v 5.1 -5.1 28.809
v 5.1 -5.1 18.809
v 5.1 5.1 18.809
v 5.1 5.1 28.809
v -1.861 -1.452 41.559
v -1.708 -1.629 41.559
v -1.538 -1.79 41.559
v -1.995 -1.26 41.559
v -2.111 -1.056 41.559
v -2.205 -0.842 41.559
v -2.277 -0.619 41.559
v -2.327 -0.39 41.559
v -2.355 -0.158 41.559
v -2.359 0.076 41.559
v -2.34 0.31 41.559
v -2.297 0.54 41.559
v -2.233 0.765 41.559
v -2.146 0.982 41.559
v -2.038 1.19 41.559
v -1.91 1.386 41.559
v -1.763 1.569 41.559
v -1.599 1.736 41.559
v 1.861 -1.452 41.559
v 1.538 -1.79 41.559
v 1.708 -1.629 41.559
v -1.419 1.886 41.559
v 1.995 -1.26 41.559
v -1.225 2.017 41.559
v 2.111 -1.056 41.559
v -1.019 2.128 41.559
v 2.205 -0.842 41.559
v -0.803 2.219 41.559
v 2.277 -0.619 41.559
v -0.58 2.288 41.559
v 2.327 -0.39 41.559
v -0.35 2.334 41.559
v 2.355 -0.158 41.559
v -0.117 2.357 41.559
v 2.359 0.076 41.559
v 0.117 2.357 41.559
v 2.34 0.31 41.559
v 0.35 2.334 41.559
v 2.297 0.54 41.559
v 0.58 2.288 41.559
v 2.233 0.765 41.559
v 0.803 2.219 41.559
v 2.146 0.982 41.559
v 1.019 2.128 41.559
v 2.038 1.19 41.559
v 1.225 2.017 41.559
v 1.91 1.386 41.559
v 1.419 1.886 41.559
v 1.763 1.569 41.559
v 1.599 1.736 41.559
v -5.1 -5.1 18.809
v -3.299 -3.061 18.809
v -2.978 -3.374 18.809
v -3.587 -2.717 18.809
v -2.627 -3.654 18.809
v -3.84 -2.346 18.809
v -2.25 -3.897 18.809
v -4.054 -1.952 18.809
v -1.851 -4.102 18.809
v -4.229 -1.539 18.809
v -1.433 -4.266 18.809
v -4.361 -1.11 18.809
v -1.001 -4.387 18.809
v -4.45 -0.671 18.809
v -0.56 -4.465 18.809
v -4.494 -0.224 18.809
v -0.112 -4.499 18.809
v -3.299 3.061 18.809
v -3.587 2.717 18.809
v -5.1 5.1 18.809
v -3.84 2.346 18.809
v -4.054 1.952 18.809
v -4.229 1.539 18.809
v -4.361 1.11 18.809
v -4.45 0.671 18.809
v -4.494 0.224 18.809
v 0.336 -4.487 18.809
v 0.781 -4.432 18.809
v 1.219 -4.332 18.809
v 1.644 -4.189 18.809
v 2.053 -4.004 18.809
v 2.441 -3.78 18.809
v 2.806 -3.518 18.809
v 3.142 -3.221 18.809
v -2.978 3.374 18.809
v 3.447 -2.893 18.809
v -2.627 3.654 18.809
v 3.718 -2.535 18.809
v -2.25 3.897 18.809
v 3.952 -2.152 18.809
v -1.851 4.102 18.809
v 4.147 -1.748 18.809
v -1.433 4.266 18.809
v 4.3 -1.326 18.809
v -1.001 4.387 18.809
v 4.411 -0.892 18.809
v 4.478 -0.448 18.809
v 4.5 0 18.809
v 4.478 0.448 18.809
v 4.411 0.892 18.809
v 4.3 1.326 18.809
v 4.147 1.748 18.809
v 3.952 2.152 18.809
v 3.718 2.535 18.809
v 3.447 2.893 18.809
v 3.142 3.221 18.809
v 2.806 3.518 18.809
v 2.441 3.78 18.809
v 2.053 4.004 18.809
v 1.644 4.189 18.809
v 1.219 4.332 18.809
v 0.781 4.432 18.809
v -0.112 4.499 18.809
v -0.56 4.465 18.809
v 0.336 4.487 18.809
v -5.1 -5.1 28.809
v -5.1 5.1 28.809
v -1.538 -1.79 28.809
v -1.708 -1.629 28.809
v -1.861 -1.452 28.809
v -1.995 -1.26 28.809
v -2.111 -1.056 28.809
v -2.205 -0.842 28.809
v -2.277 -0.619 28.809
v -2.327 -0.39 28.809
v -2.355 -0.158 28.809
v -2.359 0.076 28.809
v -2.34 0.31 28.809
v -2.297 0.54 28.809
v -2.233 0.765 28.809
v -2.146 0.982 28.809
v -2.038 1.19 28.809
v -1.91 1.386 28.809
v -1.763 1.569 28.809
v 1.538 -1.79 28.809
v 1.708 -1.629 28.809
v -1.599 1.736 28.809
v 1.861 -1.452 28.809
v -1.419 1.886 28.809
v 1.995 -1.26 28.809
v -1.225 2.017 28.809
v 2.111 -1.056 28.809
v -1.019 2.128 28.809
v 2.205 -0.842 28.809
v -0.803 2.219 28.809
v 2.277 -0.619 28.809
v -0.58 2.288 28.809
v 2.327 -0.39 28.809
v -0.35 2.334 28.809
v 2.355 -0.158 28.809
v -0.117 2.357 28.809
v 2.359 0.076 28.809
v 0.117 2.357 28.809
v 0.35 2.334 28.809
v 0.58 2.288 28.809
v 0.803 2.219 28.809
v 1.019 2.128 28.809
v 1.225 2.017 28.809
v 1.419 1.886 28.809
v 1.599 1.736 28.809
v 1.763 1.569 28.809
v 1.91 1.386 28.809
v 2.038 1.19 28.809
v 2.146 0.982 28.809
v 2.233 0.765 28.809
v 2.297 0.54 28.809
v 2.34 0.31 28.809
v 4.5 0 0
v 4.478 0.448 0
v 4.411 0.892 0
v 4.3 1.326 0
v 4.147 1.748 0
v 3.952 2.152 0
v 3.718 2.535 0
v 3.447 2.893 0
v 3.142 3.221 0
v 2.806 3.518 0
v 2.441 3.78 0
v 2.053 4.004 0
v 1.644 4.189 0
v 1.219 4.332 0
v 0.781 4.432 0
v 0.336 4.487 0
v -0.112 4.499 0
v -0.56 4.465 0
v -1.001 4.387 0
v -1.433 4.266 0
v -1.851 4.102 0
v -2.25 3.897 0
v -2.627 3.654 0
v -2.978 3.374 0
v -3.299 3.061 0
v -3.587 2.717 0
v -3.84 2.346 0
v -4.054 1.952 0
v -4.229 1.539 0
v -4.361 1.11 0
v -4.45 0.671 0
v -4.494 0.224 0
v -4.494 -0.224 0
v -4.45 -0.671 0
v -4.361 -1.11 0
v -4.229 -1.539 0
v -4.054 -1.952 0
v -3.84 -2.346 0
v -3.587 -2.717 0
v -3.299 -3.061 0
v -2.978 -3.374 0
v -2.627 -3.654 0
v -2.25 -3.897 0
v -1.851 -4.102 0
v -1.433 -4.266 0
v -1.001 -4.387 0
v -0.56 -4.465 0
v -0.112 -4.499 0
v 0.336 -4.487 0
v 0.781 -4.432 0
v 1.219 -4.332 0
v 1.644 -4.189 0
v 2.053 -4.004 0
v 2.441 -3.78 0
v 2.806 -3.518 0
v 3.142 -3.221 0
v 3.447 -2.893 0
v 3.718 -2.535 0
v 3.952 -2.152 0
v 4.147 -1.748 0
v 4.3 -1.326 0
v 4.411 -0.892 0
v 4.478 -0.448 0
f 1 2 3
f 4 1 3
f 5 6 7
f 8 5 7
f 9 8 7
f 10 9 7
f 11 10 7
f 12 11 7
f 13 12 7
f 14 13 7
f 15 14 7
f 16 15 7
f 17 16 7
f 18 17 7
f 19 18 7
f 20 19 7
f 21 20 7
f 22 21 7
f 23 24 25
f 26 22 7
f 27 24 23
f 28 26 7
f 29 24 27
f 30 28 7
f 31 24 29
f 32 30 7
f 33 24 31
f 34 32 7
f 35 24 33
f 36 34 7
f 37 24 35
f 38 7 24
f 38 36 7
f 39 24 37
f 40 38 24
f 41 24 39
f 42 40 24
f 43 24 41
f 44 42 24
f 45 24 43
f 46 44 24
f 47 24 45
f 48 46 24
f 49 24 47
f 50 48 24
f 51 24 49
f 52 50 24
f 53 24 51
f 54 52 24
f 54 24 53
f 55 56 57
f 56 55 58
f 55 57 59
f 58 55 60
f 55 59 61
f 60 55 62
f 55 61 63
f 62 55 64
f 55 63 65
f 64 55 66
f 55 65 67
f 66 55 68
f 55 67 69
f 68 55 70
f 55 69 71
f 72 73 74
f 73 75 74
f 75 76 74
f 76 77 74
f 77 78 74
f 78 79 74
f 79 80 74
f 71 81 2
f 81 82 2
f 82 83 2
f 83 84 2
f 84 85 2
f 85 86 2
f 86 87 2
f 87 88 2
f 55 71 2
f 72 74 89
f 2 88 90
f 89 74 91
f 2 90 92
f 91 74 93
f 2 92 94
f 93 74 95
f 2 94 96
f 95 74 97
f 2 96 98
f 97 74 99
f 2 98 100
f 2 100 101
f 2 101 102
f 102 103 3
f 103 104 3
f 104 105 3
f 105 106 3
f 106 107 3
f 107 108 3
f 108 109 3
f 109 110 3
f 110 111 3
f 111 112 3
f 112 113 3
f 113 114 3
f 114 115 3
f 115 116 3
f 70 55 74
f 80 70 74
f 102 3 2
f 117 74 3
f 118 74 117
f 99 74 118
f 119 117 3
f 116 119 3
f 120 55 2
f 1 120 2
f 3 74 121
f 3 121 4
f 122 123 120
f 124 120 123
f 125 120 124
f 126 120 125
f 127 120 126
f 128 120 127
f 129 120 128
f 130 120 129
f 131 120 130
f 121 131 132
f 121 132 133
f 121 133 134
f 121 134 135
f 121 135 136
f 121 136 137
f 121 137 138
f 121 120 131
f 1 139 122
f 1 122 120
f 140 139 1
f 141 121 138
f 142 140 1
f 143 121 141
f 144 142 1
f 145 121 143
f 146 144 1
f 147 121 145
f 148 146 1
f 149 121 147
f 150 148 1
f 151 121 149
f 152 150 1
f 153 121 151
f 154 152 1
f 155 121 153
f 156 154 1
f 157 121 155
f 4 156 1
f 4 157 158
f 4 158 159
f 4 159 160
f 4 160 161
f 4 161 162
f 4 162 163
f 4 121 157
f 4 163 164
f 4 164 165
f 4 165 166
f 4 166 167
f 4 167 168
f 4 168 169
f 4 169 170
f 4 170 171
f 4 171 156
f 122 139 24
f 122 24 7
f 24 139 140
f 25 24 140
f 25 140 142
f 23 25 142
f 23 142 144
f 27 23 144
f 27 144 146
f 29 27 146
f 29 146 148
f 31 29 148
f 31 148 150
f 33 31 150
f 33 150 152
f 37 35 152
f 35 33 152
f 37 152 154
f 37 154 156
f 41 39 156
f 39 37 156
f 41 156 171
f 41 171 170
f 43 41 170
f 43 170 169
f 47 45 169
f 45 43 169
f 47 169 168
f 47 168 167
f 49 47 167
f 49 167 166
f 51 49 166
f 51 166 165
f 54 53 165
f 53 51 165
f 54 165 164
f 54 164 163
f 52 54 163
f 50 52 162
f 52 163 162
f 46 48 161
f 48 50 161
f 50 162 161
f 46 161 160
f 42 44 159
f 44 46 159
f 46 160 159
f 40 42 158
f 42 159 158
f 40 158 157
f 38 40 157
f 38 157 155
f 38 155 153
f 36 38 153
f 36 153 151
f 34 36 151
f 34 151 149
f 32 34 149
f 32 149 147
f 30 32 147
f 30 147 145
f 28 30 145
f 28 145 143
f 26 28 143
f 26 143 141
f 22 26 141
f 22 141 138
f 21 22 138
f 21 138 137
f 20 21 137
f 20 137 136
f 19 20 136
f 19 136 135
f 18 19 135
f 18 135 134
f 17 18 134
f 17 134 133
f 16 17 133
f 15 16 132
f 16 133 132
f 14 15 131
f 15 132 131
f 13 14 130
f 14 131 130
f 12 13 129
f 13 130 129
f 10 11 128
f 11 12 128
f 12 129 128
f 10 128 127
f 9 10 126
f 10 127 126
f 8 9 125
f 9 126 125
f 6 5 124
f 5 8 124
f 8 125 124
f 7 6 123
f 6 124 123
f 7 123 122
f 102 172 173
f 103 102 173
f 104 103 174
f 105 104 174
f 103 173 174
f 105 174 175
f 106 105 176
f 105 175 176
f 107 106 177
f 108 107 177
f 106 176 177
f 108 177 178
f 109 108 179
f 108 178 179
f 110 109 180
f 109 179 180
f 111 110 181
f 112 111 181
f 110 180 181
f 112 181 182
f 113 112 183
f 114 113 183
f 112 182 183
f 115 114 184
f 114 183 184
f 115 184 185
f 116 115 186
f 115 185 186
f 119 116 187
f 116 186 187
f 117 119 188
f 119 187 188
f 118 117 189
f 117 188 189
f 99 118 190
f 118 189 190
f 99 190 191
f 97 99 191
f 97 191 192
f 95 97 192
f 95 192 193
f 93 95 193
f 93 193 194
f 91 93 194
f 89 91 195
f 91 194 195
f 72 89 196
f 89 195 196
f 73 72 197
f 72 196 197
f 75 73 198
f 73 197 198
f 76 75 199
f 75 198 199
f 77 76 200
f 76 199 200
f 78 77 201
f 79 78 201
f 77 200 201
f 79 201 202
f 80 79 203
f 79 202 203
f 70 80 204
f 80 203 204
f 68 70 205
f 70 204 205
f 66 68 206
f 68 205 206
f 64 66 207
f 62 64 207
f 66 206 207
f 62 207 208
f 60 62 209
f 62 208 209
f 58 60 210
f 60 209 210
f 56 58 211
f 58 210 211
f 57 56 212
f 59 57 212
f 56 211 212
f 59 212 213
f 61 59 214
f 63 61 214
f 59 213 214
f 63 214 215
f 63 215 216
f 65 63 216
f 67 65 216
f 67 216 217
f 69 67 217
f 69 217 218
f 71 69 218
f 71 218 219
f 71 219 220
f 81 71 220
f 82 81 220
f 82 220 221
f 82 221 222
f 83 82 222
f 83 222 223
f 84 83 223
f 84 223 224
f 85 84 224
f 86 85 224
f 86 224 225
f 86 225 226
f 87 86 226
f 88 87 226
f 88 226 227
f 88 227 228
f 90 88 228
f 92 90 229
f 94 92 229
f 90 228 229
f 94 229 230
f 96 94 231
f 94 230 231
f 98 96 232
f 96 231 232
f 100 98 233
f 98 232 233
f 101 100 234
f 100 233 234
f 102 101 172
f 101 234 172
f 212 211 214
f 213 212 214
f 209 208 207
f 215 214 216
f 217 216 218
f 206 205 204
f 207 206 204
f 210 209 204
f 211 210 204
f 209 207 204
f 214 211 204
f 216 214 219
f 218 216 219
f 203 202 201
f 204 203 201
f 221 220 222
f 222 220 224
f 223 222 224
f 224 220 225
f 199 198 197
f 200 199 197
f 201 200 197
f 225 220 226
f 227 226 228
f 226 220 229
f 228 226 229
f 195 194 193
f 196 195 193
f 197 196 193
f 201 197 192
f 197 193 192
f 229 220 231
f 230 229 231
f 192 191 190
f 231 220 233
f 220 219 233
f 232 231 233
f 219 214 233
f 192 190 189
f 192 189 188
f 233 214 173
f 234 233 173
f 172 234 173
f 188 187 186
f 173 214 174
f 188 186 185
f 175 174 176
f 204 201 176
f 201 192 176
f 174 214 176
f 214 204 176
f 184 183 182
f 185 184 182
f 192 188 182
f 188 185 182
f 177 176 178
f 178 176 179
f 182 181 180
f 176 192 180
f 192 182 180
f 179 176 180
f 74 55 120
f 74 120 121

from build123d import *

# Parameters (mm, degrees)
F0_R     = 4.5
F1_DEPTH = 18.8087
F2_W     = 10.2
F2_H     = 10.2
F3_DEPTH = 10
F4_R     = 2.36
F5_DEPTH = 12.75
F7_DEPTH = 12.75


with BuildPart() as f1:
    # F0 (on Top) → F1 (new body)
    with BuildSketch(Plane.XY):
        Circle(F0_R)
    extrude(amount=F1_DEPTH)

    # F2 (on face) → F3 (join)
    with BuildSketch(Plane.XY.offset(18.8087)):
        Rectangle(F2_W, F2_H)
    extrude(amount=F3_DEPTH)

    # F4 (on face) → F5 (join)
    with BuildSketch(Plane.XY.offset(28.8087)):
        Circle(F4_R)
    extrude(amount=F5_DEPTH)

    # F6 (on face) → F7 (cut)
    with BuildSketch(Plane.XY.offset(41.5587)):
        with BuildLine():
            ThreePointArc((-1.538018, -1.79), (-0.820122, -2.212917), (0, -2.36))
            Line((0, -2.36), (0, -1.79))
            Line((0, -1.79), (-1.538018, -1.79))
        make_face()
        with BuildLine():
            Line((0, -1.79), (0, -2.36))
            ThreePointArc((0, -2.36), (0.820122, -2.212917), (1.538018, -1.79))
            Line((1.538018, -1.79), (0, -1.79))
        make_face()
    extrude(amount=-F7_DEPTH, mode=Mode.SUBTRACT)


solid = f1.part
